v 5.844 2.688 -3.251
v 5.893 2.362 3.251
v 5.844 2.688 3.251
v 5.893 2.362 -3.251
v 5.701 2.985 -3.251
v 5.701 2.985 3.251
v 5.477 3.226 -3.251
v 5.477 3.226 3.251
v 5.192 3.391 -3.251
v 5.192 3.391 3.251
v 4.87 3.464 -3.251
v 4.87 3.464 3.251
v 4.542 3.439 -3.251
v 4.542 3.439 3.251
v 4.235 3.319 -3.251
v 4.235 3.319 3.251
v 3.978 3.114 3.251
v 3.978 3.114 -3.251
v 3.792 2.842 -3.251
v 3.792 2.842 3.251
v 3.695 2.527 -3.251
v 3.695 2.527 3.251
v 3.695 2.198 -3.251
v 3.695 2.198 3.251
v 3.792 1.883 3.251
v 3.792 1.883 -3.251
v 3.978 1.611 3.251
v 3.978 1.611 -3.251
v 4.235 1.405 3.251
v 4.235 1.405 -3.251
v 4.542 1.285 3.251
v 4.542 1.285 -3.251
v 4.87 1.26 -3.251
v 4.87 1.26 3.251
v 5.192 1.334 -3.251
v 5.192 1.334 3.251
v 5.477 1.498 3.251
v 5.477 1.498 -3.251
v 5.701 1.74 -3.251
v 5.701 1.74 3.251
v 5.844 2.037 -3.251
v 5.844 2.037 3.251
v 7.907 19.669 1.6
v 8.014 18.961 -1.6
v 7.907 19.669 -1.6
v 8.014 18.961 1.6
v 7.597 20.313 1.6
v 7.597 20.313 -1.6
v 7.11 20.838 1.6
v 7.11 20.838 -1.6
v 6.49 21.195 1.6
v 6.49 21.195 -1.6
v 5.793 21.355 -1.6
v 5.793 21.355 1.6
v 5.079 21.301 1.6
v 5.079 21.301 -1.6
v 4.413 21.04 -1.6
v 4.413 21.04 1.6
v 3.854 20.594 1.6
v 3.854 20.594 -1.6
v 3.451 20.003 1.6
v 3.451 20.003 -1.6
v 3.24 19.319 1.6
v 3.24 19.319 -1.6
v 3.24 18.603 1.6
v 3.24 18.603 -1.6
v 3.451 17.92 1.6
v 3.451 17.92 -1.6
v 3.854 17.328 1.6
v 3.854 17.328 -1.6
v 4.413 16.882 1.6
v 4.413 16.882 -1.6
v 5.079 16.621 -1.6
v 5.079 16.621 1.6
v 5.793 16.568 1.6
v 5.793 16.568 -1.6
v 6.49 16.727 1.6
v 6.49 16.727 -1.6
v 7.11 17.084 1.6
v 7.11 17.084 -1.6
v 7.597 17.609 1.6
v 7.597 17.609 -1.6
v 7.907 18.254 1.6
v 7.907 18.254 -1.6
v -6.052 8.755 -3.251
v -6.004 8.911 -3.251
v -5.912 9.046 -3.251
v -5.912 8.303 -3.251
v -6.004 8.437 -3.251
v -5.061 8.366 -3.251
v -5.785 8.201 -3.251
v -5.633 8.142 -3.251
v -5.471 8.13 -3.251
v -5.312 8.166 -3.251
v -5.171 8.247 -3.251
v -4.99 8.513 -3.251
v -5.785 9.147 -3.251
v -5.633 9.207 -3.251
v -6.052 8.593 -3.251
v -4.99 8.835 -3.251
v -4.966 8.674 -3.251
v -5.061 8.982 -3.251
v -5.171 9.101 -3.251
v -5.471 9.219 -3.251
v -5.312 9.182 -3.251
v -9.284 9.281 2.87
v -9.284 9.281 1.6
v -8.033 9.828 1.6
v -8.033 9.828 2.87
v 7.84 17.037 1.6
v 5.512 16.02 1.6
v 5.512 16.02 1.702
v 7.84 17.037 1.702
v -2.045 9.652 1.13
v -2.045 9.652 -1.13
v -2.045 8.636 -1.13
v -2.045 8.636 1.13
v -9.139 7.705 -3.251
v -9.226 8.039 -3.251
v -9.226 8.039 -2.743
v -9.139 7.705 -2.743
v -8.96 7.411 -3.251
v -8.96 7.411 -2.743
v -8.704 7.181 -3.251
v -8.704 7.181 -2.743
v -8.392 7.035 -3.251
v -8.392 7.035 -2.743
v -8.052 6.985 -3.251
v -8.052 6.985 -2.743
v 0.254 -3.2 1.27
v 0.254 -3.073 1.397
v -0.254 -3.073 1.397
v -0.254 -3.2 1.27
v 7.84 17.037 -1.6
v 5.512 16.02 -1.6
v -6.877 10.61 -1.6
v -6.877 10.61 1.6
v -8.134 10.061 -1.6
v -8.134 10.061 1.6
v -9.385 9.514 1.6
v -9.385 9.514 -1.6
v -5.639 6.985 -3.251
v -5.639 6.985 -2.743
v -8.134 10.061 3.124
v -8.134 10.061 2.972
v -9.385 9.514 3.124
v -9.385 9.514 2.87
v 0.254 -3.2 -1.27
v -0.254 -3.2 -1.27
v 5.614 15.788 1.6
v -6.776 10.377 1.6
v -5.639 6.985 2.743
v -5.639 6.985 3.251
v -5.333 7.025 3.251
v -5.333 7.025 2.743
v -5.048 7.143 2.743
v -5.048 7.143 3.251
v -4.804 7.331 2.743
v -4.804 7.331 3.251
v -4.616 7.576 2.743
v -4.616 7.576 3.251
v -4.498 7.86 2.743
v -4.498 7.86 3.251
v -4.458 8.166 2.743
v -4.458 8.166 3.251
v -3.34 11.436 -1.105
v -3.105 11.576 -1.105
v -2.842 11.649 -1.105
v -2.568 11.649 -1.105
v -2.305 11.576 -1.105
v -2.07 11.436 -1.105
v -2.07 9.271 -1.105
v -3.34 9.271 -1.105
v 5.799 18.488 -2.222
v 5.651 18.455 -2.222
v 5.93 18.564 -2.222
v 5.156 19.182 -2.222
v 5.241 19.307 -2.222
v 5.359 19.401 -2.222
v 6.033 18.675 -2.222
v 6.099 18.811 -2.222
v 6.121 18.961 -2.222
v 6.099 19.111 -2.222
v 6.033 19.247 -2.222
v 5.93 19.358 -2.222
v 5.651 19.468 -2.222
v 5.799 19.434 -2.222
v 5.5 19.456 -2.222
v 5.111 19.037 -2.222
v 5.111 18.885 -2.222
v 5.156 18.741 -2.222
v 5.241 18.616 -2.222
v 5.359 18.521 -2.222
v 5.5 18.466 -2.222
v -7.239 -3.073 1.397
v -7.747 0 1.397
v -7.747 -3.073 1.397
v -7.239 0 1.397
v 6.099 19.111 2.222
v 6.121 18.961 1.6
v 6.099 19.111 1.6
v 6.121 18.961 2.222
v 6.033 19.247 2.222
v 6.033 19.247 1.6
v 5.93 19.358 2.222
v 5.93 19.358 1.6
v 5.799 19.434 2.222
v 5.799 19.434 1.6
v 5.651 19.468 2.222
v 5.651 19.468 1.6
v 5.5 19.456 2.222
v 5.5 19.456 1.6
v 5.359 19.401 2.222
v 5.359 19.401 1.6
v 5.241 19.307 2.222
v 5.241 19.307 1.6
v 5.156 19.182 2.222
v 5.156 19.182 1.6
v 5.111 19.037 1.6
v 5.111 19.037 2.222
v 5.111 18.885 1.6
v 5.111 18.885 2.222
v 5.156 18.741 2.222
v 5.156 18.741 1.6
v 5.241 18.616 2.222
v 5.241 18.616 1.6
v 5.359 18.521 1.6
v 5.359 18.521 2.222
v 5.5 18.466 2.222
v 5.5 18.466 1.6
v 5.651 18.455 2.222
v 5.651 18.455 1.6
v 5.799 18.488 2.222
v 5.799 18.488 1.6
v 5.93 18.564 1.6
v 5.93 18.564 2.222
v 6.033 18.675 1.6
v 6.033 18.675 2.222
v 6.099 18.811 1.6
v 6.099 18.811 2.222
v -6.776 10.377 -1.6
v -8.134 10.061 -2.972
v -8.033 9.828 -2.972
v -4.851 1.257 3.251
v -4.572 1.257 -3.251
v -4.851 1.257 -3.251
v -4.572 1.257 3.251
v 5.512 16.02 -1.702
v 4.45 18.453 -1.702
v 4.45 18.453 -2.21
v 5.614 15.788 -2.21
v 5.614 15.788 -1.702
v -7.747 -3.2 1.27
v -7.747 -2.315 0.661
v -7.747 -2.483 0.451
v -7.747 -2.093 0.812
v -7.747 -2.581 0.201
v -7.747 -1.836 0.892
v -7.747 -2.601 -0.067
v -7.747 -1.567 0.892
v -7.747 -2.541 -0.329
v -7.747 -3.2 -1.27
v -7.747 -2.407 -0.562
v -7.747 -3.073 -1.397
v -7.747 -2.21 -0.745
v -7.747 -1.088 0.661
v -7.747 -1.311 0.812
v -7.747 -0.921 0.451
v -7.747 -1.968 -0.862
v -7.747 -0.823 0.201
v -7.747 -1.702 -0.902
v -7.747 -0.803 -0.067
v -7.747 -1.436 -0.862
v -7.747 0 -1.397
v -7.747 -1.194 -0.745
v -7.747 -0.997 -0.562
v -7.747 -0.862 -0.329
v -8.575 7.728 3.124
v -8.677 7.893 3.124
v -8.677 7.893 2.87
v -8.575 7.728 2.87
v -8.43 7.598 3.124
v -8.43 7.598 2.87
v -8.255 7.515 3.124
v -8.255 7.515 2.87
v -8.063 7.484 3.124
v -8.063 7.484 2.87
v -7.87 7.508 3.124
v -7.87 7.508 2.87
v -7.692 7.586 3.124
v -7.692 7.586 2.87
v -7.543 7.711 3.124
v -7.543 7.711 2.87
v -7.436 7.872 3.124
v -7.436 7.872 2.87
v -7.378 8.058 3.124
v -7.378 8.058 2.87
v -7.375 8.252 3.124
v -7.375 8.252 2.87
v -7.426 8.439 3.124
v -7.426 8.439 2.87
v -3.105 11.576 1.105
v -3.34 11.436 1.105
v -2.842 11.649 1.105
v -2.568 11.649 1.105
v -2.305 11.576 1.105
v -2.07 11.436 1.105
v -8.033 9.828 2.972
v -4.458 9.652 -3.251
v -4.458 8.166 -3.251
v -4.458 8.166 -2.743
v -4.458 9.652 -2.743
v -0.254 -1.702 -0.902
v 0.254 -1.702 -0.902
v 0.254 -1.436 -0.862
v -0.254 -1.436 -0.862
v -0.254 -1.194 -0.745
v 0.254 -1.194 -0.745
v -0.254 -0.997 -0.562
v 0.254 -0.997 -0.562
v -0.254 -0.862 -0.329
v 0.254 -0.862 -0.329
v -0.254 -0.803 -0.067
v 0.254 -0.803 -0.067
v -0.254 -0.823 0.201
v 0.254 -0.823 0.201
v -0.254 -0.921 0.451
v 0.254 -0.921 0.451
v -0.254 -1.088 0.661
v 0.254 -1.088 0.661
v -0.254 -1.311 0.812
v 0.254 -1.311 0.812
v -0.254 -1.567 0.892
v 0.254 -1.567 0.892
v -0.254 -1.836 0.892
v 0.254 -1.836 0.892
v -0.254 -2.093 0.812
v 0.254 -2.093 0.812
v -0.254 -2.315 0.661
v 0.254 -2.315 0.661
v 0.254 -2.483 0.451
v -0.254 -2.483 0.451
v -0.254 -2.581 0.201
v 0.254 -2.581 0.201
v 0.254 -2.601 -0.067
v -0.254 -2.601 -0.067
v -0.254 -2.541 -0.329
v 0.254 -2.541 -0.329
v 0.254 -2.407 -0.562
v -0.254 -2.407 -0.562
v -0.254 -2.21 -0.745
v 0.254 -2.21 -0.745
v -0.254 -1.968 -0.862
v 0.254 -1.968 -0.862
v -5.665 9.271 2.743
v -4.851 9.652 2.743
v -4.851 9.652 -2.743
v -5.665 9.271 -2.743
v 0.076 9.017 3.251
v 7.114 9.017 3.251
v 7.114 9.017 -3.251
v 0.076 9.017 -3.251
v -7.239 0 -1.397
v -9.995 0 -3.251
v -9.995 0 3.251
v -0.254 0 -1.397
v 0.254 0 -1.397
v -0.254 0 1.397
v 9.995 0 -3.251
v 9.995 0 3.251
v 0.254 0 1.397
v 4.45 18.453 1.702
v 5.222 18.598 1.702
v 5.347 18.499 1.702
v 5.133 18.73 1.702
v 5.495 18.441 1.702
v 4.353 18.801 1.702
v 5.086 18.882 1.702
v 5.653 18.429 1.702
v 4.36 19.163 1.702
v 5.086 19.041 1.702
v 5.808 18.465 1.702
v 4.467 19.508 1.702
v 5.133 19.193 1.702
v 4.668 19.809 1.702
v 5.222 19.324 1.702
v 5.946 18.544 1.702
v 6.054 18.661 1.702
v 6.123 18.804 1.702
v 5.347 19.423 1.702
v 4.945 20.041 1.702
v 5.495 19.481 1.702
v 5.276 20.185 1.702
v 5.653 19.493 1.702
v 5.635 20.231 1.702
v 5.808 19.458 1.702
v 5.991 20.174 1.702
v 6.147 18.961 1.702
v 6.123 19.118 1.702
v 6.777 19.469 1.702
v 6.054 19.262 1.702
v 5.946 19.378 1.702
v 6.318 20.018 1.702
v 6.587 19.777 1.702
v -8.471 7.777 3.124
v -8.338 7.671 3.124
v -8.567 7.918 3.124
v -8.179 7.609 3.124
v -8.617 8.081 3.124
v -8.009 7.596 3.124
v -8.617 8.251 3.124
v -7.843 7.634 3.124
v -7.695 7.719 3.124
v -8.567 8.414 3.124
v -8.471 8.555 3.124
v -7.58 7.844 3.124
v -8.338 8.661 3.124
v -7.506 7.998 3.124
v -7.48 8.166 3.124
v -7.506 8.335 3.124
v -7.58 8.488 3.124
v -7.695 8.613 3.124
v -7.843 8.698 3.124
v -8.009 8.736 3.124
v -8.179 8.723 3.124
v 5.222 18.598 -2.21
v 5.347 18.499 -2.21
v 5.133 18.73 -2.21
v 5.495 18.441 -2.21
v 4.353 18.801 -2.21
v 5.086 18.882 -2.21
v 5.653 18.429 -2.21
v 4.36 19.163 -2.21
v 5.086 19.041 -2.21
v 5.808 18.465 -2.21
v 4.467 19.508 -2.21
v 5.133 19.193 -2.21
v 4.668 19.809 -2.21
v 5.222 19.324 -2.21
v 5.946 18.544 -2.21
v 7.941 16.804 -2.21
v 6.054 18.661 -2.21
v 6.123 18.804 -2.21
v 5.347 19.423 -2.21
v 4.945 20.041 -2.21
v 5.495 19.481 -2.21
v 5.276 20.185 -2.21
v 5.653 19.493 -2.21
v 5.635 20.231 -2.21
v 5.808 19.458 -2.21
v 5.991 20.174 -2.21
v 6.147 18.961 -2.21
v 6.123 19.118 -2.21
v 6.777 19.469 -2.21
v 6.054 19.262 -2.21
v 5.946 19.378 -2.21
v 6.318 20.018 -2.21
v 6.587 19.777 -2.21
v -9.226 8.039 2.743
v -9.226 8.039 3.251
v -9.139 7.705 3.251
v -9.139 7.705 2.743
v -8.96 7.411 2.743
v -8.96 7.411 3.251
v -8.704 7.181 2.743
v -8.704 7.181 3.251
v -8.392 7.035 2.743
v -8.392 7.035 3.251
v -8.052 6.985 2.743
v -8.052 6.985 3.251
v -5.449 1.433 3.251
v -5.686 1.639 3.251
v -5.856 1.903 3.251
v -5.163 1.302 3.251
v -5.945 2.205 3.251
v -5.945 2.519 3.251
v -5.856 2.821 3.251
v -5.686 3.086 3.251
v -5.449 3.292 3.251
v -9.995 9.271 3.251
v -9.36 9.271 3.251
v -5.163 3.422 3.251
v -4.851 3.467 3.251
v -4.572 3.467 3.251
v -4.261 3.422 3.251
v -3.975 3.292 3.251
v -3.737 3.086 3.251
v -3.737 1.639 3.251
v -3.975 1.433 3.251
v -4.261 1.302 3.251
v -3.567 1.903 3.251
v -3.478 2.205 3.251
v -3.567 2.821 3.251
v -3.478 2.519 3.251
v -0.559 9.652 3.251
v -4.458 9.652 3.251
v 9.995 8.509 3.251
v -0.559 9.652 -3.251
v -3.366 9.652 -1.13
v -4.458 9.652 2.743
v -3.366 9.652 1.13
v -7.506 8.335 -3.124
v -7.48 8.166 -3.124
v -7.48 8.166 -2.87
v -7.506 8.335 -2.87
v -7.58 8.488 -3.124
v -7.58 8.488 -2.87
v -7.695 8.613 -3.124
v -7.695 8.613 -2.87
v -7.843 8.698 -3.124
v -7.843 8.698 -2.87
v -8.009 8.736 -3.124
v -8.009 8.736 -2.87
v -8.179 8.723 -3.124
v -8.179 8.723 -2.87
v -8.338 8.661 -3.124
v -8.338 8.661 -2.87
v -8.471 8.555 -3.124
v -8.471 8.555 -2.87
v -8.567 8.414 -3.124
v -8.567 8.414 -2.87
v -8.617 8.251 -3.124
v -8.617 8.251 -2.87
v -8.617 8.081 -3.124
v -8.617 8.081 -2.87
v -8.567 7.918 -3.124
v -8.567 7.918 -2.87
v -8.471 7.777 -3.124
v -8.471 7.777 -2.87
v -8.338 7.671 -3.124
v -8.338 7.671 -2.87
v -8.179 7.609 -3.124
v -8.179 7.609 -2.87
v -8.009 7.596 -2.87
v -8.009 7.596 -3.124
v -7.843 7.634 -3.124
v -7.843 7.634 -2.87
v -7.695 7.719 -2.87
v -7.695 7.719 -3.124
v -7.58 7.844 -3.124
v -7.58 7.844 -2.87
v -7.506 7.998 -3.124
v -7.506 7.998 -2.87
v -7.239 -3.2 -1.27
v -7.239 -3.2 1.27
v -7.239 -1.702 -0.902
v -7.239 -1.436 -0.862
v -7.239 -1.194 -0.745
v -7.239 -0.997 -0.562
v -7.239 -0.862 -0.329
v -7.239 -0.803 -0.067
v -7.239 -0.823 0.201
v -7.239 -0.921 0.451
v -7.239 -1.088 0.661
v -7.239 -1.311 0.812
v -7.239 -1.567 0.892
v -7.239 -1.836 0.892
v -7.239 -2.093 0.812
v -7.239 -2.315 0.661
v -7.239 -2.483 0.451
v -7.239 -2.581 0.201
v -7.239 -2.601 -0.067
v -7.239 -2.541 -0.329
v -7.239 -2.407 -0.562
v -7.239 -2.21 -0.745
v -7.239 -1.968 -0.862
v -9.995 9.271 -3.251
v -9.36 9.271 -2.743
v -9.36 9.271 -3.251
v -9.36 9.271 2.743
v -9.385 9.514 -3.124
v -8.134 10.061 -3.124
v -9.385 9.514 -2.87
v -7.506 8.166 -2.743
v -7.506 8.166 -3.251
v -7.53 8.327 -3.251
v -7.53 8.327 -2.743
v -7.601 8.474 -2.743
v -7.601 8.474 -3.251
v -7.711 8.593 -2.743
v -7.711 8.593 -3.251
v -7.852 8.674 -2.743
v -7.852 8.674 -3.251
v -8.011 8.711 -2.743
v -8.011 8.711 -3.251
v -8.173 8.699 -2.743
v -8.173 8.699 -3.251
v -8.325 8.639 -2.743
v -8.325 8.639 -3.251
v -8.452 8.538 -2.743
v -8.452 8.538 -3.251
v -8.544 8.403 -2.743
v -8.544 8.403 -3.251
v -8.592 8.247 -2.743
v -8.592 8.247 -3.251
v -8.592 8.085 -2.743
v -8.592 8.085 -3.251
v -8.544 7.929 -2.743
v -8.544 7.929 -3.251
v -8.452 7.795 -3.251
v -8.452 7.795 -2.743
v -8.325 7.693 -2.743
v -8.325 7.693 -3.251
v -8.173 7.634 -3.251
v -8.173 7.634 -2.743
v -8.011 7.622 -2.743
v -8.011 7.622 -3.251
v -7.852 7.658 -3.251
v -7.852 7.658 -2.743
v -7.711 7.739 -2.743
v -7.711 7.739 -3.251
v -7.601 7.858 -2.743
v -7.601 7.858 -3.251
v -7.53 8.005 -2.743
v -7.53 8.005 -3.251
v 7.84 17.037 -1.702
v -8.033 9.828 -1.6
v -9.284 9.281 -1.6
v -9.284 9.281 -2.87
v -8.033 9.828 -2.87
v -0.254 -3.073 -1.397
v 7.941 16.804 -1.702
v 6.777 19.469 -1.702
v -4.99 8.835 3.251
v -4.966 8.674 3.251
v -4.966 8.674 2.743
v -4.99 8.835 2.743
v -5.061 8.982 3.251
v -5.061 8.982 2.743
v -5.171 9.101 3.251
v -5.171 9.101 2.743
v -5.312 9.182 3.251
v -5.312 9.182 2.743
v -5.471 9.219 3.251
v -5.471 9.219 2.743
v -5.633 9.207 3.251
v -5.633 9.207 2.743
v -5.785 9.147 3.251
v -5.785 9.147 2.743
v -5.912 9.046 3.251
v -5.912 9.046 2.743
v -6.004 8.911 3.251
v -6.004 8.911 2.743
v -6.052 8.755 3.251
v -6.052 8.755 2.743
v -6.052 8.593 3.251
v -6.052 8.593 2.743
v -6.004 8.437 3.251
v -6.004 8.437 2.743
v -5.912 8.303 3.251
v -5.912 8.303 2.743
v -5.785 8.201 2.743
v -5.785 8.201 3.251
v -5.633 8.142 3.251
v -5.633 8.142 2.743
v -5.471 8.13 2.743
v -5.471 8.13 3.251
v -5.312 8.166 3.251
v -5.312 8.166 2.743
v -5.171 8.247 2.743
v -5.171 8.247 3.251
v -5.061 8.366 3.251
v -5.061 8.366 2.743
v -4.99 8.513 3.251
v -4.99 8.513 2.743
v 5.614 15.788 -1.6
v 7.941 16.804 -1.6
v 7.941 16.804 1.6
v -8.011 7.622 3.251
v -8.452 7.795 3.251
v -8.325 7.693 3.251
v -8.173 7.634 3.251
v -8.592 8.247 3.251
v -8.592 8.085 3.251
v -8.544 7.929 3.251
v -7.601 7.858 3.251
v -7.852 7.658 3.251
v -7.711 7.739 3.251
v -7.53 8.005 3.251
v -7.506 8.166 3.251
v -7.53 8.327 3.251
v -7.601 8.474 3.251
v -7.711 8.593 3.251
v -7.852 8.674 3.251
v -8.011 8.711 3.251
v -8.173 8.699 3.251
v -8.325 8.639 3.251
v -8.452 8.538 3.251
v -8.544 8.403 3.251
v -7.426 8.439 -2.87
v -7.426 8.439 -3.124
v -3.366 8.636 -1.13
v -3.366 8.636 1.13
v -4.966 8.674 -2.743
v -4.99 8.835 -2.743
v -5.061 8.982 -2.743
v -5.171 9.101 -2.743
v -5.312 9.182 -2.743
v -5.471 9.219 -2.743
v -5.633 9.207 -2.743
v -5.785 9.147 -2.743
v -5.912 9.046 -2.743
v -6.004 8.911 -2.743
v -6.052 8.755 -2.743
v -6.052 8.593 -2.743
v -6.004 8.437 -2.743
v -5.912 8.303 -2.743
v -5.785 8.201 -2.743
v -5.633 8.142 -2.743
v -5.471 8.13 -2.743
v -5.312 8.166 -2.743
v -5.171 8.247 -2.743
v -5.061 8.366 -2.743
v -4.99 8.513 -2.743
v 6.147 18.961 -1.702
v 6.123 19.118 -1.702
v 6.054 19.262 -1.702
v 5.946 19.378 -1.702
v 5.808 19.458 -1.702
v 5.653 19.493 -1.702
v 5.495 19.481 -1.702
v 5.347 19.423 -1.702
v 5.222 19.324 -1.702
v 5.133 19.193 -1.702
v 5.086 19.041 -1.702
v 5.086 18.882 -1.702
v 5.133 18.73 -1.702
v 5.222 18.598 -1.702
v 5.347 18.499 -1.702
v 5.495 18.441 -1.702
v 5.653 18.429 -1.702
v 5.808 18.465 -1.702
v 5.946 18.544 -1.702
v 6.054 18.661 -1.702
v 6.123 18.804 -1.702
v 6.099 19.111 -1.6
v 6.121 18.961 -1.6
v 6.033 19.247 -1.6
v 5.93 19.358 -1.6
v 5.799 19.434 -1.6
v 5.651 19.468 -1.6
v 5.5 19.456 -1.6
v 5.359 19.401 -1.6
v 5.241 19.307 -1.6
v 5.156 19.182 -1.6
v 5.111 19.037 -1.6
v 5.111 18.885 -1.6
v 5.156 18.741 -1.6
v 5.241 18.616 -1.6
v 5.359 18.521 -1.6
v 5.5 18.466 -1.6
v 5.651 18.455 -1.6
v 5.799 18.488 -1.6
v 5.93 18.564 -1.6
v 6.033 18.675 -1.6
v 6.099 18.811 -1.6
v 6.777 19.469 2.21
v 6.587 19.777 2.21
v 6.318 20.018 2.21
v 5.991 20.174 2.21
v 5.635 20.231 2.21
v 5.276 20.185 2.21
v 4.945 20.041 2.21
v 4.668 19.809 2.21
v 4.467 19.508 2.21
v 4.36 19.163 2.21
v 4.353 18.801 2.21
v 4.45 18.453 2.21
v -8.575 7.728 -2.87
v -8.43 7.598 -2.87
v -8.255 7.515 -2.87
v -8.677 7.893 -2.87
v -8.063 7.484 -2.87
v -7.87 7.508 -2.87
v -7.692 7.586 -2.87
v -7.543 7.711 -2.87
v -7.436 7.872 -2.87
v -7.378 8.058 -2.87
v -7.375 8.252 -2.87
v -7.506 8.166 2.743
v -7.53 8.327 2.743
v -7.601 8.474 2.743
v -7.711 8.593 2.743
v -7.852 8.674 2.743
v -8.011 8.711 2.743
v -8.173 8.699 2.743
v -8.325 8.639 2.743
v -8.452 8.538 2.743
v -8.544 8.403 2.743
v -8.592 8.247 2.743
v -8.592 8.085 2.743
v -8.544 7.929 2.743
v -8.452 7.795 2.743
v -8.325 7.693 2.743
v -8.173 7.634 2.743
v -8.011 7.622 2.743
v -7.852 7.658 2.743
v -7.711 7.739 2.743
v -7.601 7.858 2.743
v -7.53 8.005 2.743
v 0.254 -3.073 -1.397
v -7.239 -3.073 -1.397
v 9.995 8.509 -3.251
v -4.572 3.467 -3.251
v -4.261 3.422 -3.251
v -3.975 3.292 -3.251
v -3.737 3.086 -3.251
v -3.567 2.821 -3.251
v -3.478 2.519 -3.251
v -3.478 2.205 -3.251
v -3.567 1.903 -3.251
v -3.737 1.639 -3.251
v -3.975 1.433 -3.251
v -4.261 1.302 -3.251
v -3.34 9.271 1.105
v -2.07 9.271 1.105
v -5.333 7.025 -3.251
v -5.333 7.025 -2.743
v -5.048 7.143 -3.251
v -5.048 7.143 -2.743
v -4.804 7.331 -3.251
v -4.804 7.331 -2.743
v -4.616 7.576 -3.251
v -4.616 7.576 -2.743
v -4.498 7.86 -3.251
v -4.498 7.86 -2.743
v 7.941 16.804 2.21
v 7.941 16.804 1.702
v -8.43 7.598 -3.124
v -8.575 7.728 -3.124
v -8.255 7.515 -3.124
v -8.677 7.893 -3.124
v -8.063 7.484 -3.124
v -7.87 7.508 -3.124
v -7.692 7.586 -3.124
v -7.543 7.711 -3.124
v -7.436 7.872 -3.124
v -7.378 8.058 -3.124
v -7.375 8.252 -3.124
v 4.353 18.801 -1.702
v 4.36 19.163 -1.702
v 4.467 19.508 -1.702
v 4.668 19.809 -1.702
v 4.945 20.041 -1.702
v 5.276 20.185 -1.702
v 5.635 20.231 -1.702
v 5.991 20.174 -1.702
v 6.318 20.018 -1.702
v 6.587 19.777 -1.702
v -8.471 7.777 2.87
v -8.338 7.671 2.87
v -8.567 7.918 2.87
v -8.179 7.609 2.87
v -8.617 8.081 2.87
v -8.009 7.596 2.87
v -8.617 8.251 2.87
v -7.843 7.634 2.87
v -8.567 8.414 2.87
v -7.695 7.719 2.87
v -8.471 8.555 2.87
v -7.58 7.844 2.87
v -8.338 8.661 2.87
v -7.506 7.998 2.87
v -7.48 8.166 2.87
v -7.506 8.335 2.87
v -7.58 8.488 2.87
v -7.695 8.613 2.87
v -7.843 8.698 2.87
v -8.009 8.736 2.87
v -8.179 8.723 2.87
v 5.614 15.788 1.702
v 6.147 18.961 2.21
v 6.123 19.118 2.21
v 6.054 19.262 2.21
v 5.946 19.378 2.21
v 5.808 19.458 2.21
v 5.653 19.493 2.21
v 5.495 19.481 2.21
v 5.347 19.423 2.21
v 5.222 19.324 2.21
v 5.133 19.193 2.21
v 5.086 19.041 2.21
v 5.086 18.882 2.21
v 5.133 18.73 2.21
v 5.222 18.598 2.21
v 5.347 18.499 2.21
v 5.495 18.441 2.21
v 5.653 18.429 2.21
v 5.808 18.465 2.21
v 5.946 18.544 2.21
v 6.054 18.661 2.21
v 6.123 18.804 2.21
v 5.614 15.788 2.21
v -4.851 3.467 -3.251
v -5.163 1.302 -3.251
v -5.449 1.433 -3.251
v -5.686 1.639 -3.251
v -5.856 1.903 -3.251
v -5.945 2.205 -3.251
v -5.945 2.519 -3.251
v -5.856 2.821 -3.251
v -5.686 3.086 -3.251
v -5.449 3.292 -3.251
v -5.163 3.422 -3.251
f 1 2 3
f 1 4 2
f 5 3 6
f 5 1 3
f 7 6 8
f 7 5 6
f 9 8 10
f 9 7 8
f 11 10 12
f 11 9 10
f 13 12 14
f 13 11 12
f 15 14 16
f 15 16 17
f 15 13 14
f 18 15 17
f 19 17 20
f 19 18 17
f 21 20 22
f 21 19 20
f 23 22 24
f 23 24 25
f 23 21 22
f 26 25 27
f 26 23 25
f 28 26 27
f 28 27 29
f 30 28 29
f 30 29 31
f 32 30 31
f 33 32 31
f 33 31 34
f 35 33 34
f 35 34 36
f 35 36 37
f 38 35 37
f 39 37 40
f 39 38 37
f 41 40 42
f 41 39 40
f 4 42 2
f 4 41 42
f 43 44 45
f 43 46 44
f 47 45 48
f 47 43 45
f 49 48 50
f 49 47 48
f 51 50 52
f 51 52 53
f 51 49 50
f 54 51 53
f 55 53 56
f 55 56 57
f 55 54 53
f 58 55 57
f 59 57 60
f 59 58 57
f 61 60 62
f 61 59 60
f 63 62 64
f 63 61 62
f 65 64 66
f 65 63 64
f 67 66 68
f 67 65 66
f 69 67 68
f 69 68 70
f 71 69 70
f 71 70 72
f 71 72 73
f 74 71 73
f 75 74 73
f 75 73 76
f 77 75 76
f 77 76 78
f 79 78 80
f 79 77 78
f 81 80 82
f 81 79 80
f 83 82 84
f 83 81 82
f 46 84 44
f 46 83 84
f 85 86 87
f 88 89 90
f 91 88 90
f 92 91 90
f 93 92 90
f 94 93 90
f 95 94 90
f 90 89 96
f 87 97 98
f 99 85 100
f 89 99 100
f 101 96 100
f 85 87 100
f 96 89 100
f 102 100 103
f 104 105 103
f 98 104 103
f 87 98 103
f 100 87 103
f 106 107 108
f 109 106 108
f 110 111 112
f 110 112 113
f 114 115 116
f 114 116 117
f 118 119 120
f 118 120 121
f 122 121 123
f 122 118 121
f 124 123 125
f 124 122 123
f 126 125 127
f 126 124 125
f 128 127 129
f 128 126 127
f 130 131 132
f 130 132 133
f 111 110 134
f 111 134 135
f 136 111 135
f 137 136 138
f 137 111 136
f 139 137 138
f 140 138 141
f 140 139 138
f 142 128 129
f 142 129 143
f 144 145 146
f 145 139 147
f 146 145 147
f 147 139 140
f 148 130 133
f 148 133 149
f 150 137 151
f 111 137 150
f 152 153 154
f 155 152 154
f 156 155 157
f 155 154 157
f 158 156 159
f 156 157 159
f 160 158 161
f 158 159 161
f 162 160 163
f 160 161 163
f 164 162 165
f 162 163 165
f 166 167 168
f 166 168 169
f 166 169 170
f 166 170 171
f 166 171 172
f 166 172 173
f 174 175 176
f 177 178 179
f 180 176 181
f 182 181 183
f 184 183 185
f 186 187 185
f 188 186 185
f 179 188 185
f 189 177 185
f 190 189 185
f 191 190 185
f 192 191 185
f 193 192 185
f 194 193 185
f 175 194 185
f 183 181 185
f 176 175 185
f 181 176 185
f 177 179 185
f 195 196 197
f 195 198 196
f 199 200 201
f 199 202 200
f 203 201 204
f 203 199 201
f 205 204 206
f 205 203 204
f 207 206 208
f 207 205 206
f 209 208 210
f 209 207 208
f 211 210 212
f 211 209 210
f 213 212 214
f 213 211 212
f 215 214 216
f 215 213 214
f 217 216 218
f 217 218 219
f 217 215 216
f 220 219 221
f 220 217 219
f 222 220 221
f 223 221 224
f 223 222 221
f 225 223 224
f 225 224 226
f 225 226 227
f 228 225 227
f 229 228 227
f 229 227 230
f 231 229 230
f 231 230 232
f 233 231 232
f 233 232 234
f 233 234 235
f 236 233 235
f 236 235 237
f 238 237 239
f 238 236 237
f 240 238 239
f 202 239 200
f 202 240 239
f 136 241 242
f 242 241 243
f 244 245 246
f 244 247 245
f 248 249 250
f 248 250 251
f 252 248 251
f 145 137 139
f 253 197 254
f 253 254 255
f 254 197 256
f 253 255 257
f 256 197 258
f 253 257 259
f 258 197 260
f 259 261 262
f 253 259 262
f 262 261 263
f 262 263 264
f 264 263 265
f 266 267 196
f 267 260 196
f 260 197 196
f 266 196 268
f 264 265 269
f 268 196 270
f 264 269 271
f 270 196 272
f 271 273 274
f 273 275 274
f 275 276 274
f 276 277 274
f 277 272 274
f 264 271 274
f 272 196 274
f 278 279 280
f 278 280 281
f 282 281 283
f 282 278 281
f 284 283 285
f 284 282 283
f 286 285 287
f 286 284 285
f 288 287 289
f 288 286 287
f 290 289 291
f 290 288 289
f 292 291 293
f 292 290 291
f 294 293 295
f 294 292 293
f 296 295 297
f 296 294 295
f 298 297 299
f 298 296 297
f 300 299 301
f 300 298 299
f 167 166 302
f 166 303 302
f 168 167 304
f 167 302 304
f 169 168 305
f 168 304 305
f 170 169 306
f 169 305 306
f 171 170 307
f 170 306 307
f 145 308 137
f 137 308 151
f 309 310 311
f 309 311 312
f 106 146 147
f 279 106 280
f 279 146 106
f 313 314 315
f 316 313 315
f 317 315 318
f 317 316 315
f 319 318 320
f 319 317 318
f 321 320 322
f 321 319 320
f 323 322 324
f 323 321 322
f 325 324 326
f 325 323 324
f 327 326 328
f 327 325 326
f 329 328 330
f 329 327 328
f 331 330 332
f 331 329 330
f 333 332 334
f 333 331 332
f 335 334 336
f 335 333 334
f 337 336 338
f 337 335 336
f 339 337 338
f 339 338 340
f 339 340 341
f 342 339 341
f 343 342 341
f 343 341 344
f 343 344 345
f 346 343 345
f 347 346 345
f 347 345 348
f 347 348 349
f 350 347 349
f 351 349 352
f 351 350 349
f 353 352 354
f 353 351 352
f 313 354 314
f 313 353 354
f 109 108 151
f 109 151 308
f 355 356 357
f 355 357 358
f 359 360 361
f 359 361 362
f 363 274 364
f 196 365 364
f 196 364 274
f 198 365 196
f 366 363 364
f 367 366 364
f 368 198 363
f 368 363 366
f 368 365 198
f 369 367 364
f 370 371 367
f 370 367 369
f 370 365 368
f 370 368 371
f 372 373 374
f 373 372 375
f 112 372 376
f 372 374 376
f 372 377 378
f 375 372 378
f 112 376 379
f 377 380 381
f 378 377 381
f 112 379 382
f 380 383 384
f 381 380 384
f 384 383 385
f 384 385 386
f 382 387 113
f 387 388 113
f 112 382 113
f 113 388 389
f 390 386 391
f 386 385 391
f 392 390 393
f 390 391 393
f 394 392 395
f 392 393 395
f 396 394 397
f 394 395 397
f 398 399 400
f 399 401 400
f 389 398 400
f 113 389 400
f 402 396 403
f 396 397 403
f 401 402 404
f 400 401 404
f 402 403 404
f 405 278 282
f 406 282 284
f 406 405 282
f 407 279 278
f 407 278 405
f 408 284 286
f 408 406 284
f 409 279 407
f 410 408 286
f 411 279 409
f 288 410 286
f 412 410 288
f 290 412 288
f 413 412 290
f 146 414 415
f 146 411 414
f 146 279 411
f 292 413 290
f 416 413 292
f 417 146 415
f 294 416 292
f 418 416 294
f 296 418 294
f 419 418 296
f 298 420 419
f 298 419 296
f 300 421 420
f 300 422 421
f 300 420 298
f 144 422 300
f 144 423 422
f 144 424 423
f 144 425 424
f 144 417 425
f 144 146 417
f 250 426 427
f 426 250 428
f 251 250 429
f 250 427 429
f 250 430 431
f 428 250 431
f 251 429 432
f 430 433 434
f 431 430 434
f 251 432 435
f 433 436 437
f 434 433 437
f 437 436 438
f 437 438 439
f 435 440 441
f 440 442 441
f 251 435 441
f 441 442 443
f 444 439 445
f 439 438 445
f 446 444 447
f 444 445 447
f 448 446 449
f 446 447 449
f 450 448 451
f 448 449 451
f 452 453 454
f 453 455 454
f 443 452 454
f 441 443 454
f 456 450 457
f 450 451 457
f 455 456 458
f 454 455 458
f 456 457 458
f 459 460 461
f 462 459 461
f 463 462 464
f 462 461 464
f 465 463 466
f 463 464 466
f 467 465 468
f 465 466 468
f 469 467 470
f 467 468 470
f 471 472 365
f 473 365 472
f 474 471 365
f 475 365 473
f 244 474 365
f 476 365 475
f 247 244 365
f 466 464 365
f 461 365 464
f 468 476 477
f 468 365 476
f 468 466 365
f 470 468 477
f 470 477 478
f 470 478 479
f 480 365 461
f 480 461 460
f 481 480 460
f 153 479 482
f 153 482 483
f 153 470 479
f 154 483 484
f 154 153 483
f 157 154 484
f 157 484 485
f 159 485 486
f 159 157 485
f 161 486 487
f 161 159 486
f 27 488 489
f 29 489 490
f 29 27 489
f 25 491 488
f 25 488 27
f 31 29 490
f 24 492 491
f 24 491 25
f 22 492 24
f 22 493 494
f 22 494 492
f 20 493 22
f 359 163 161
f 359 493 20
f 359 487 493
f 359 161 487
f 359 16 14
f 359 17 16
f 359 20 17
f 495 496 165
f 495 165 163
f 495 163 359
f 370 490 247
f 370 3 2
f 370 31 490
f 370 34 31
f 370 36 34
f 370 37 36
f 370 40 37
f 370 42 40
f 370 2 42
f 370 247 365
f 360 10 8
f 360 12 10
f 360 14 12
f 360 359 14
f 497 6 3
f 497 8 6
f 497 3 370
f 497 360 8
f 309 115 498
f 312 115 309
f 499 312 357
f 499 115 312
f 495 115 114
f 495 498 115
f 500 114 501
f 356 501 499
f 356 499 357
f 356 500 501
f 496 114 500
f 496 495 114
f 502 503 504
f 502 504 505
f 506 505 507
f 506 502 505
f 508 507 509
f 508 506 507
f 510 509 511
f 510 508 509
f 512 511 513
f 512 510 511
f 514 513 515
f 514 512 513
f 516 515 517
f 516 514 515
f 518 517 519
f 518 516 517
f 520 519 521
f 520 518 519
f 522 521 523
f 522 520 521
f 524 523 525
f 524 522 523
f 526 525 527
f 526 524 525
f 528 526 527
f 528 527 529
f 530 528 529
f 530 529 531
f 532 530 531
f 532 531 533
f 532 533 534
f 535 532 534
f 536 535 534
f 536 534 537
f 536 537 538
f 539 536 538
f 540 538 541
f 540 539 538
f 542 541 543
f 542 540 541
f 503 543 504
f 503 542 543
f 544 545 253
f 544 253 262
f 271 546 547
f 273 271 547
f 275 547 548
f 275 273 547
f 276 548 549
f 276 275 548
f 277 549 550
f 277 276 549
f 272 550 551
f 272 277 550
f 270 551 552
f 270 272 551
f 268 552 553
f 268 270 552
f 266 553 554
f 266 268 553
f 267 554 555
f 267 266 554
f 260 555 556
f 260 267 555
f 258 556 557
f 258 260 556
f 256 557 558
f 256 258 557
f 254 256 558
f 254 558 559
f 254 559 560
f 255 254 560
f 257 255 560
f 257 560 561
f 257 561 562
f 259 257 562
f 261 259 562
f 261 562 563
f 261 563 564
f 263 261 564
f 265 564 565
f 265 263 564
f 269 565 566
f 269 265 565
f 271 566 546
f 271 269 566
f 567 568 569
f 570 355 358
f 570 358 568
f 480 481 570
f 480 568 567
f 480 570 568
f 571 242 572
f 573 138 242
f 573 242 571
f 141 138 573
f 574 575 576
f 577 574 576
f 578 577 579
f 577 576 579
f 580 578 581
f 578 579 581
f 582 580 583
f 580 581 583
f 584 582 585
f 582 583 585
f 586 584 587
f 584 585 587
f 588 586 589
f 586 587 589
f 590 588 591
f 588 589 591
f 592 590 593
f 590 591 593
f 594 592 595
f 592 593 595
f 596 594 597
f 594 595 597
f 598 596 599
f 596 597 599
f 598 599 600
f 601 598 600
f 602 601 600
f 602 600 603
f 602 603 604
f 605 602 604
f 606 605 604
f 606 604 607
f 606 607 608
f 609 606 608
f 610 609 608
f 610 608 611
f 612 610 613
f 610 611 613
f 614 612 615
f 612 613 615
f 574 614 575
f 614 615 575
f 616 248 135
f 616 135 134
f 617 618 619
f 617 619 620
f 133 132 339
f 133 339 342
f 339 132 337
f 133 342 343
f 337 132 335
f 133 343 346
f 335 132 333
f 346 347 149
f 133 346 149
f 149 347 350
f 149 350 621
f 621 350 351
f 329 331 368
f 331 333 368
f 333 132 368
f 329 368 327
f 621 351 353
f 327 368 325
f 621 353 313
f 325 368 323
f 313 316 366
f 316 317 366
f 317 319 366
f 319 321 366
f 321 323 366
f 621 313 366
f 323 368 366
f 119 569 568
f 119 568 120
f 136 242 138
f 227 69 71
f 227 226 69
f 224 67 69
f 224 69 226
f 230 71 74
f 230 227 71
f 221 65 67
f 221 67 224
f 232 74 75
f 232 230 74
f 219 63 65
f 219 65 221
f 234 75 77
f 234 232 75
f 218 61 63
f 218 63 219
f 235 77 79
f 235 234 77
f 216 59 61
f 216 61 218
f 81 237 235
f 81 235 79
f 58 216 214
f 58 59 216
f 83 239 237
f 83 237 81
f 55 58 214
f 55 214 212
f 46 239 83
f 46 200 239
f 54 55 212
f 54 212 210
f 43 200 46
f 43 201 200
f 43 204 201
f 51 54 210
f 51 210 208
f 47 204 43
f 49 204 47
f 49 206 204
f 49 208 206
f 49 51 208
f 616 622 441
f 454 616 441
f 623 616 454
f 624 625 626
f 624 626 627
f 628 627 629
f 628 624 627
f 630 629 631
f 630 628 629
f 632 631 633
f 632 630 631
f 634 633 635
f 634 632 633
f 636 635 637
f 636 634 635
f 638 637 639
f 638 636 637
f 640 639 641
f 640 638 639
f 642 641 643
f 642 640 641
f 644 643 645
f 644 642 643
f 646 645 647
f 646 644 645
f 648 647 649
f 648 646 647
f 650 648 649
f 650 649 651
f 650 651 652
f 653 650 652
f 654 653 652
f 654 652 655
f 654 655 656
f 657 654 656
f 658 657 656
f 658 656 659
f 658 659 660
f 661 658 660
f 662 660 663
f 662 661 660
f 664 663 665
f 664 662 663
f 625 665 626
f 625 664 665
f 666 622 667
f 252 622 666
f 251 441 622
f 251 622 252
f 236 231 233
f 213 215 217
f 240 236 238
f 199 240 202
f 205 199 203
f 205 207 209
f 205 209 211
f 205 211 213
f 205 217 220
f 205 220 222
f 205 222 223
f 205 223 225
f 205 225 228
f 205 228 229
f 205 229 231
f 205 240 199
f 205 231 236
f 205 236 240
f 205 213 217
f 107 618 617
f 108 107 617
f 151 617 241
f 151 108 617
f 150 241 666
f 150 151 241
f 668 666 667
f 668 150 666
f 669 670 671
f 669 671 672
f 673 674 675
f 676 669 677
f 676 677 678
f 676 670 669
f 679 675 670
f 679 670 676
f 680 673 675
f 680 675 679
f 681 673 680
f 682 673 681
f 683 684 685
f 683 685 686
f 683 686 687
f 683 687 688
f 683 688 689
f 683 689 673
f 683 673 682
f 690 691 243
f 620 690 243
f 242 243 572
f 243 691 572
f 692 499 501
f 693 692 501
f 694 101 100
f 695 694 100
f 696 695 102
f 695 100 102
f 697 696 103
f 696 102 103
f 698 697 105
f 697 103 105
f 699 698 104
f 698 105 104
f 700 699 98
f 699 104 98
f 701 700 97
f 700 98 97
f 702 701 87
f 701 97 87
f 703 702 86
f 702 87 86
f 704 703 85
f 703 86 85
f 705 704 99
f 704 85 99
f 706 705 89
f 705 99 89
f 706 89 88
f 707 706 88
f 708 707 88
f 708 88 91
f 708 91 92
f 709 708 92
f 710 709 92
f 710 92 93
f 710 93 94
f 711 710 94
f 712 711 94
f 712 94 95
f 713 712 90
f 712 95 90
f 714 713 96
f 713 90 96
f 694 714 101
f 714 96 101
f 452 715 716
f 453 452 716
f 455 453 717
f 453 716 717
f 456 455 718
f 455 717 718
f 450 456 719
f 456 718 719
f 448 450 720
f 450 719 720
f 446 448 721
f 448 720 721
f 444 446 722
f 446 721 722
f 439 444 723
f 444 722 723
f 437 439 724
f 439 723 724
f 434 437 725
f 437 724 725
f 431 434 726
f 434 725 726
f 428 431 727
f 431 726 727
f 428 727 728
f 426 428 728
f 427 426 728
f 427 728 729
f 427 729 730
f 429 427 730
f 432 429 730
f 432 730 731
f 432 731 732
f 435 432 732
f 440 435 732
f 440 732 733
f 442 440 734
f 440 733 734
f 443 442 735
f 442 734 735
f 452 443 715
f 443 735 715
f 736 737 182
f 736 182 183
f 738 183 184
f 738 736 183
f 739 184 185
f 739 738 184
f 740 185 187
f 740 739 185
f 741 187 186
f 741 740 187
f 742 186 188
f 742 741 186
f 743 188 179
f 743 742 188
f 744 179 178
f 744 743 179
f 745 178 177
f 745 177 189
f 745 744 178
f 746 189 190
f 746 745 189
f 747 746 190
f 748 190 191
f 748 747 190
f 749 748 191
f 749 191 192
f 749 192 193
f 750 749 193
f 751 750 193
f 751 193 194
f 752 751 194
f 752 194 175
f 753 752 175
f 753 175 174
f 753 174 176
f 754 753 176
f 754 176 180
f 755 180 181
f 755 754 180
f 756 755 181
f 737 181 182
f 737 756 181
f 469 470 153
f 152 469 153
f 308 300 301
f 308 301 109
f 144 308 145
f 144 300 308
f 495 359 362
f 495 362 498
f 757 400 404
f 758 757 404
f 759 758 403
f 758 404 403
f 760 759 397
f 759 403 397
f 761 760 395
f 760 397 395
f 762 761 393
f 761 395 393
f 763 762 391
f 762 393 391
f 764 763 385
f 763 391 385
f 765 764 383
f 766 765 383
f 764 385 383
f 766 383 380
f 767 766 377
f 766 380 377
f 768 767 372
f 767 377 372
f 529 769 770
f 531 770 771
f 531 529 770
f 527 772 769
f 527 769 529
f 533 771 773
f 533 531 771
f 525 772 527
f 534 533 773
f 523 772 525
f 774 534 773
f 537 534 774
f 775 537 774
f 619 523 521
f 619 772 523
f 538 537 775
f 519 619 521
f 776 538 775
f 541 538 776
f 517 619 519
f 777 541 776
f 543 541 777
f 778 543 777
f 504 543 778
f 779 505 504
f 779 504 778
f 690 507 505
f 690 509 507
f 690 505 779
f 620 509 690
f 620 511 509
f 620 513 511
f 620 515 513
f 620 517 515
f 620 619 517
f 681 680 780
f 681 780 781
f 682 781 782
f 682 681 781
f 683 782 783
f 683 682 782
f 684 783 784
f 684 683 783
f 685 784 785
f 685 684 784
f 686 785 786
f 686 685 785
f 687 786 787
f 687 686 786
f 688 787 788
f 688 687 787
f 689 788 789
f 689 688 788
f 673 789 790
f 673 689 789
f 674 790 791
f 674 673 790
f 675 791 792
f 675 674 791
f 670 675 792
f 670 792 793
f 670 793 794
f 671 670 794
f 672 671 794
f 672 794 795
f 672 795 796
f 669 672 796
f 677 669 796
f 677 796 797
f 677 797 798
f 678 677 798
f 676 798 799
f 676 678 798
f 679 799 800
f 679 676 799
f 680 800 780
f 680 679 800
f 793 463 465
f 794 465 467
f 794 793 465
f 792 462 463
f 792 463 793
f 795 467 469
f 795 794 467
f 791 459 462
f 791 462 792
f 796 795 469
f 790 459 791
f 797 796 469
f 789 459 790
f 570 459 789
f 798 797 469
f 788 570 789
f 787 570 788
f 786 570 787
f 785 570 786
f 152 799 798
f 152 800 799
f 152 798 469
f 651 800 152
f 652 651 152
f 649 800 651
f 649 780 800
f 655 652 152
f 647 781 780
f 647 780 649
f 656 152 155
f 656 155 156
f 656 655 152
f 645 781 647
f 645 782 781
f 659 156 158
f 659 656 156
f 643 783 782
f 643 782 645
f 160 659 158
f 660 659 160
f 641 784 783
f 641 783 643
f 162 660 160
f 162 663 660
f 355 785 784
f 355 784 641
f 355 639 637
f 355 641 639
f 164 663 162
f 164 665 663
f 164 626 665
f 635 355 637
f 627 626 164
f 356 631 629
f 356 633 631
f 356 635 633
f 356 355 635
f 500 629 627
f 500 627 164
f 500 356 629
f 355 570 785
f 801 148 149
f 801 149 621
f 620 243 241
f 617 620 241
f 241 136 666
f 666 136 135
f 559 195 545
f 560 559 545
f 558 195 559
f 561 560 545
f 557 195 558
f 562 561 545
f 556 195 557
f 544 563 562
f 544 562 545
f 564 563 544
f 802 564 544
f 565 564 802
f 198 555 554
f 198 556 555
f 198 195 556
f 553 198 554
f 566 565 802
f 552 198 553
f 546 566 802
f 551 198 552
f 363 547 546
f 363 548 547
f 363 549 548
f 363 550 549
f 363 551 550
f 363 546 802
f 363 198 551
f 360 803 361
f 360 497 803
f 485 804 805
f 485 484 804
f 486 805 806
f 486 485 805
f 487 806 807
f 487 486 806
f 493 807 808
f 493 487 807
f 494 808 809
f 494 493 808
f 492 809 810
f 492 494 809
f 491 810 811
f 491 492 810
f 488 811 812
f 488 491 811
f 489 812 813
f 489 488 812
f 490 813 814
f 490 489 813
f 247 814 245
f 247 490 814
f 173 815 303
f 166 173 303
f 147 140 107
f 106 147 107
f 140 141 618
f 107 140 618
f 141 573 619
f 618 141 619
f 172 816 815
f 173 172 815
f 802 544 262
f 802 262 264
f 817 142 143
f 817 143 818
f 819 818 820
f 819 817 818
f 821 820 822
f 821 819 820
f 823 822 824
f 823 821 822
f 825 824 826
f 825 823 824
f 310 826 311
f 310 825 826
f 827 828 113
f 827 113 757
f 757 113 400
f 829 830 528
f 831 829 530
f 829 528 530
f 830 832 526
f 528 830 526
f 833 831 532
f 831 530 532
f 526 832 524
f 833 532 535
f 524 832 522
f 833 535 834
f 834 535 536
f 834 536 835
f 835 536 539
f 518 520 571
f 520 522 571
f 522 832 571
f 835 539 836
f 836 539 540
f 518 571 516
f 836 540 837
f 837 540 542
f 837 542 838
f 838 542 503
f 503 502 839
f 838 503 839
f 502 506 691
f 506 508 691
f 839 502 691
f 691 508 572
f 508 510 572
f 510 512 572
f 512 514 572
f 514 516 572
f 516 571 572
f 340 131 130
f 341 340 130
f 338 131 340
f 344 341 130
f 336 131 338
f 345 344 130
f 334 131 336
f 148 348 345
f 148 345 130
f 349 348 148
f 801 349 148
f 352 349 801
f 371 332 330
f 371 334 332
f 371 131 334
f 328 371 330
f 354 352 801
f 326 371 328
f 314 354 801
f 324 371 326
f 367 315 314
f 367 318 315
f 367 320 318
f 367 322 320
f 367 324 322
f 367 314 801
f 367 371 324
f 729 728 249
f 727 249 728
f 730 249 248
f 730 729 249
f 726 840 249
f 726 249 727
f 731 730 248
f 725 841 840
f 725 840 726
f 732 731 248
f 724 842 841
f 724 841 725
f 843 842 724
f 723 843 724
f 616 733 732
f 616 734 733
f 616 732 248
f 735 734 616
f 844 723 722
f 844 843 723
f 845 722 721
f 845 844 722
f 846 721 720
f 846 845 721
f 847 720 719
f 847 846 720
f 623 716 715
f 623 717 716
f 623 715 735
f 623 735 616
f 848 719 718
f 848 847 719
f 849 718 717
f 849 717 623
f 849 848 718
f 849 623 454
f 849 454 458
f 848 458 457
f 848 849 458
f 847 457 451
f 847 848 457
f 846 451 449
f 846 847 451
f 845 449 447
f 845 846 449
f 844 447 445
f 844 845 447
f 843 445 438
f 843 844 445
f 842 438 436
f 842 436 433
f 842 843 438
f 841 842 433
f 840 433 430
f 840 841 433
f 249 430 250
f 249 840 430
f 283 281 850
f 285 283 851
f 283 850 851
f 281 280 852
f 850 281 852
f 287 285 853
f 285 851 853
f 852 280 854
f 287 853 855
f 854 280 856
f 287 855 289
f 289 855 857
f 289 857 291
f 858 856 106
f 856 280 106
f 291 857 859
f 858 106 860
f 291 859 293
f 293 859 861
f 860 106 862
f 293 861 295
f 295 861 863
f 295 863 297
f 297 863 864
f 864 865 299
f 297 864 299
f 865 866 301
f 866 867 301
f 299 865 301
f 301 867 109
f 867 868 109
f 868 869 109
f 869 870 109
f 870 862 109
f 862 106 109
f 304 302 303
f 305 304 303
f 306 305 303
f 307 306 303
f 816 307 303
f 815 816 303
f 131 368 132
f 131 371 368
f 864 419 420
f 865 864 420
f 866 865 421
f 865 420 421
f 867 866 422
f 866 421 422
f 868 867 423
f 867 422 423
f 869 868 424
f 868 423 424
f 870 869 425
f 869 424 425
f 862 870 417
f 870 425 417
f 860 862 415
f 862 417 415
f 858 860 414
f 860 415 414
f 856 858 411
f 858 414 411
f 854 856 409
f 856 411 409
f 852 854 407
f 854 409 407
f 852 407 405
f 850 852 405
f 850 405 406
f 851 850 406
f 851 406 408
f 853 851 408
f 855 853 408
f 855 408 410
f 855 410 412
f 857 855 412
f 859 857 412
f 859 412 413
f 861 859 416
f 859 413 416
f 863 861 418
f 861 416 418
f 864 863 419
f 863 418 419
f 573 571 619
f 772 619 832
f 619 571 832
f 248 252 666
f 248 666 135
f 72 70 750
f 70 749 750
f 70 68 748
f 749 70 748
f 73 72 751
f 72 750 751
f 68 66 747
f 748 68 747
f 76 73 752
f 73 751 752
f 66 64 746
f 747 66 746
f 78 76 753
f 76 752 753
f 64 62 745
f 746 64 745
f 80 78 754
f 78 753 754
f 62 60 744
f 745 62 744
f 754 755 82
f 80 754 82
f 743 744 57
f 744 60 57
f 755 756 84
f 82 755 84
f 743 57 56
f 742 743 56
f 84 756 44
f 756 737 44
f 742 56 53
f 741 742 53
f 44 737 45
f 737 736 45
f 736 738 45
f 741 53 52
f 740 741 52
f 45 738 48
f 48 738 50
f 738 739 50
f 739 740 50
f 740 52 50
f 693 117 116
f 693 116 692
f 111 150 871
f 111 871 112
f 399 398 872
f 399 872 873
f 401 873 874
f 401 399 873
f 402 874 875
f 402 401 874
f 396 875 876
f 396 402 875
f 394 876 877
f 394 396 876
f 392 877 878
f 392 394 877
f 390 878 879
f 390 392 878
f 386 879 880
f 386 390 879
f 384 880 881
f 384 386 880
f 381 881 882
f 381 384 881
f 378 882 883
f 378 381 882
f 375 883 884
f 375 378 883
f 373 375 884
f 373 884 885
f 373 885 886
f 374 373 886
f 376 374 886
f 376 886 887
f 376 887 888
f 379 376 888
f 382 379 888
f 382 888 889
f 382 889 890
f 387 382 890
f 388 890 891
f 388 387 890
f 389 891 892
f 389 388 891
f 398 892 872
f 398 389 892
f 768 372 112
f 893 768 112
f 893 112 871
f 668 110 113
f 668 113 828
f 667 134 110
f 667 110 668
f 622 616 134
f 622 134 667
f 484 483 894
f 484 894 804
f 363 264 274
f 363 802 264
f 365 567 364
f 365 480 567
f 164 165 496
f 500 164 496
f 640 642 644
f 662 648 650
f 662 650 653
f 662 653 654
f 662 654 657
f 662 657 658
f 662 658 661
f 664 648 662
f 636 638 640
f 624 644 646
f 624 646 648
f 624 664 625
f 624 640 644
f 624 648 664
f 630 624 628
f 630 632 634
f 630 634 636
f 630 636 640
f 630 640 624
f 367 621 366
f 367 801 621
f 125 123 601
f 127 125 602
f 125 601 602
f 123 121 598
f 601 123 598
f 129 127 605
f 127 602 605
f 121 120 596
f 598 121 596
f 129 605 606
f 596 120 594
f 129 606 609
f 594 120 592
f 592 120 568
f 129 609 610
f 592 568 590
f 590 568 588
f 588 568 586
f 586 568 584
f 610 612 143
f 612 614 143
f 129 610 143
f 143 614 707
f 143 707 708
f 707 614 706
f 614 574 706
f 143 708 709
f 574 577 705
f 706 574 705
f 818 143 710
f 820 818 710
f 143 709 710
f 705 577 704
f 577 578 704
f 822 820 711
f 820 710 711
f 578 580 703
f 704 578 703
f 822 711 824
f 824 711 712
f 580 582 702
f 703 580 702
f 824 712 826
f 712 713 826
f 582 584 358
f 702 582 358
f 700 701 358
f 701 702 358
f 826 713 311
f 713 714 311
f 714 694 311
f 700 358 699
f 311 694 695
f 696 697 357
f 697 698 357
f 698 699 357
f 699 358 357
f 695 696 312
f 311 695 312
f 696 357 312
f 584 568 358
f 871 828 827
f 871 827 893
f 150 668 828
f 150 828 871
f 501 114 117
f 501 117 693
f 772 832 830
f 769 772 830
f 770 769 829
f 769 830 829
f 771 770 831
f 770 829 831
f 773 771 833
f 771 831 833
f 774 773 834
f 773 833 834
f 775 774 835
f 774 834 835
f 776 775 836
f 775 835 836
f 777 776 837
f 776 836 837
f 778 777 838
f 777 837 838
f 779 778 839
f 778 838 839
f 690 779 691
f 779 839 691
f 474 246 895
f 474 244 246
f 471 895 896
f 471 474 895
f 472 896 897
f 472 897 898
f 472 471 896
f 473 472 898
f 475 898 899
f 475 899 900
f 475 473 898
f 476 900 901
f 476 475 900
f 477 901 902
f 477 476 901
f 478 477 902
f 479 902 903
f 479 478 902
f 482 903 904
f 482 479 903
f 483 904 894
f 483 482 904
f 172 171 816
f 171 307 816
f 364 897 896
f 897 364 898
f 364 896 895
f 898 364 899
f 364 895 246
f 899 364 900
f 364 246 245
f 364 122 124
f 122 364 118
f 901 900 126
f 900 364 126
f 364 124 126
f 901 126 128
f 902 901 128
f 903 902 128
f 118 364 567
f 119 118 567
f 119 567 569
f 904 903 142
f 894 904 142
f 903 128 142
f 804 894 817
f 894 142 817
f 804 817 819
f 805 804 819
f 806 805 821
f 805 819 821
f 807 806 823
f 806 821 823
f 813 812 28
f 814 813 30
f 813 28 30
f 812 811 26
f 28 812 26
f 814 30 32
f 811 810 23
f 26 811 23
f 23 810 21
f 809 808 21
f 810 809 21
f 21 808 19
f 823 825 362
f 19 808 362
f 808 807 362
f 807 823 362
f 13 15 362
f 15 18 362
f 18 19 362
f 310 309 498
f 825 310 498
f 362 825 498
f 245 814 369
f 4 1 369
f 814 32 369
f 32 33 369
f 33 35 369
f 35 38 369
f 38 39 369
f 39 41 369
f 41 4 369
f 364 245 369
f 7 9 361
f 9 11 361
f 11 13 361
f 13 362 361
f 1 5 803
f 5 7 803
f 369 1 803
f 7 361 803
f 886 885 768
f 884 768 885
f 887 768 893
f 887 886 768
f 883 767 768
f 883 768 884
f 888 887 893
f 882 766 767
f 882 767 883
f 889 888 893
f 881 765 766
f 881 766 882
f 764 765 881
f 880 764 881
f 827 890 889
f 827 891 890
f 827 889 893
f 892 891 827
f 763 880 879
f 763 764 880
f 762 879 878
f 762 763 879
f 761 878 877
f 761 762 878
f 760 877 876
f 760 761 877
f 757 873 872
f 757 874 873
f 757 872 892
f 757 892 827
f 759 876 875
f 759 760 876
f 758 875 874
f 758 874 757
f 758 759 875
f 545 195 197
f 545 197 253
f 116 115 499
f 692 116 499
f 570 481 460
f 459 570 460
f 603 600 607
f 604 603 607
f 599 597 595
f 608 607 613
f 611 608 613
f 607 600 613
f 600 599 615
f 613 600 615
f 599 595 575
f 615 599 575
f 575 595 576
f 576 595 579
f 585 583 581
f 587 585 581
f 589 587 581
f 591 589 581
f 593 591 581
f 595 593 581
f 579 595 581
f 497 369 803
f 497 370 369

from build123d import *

# Parameters (mm, degrees)
SKETCH2_R            = 1.1049
EXTRUDE1_DEPTH       = 3.2512
EXTRUDE2_DEPTH       = 1.1049
SKETCH4_W            = 1.3208
SKETCH4_H            = 2.2606
CUT_EXTRUDE1_DEPTH   = 1.016
SKETCH5_R            = 0.5461
CUT_EXTRUDE2_DEPTH   = 0.508
SKETCH10_R           = 0.9017
EXTRUDE6_DEPTH       = 0.254
LPATTERN1_COUNT      = 2
LPATTERN1_PITCH      = 7.493
EXTRUDE3_DEPTH       = 1.6002
EXTRUDE4_START       = -0.127
SKETCH8_R            = 0.5715
EXTRUDE4_DEPTH       = 0.254
EXTRUDE5_DEPTH       = 1.27
SKETCH11_R           = 2.4003
EXTRUDE7_DEPTH       = 1.6002
SKETCH12_R           = 0.508
EXTRUDE8_DEPTH       = 2.2225
EXTRUDE9_START       = 0.1016
SKETCH13_R           = 0.5334
EXTRUDE9_DEPTH       = 0.508
EXTRUDE10_DEPTH      = 2.2098
EXTRUDE10_DEPTH_BACK = 2.2098


with BuildPart() as part:
    # Sketch2 → Extrude1 (new, symmetric)
    with BuildSketch(Plane.XY):
        Polygon((9.9949, 8.509), (7.113888836, 9.017), (0.0762, 9.017), (-0.5588, 9.652), (-4.8514, 9.652), (-5.664596778, 9.271), (-9.9949, 9.271), (-9.9949, 0), (9.9949, 0), align=None)
        with Locations((4.7879, 2.3622)):
            Circle(SKETCH2_R, mode=Mode.SUBTRACT)
        with BuildLine():
            Line((-4.8514, 3.4671), (-4.572, 3.4671))
            ThreePointArc((-4.572, 3.4671), (-3.4671, 2.3622), (-4.572, 1.2573))
            Line((-4.572, 1.2573), (-4.8514, 1.2573))
            ThreePointArc((-4.8514, 1.2573), (-5.9563, 2.3622), (-4.8514, 3.4671))
        make_face(mode=Mode.SUBTRACT)
    extrude(amount=EXTRUDE1_DEPTH, both=True)

    # Sketch4 → Cut-Extrude1 (cut)
    with BuildSketch(Plane(origin=(0, 9.652, 0), x_dir=(-1, 0, 0), z_dir=(0, 1, 0))):
        with Locations((2.7051, 0)):
            Rectangle(SKETCH4_W, SKETCH4_H)
    extrude(amount=-CUT_EXTRUDE1_DEPTH, mode=Mode.SUBTRACT)

    # Sketch5 → Cut-Extrude2 (cut)
    with BuildSketch(Plane.XY.offset(3.2512)):
        with BuildLine():
            Line((-8.0518, 6.985), (-5.6388, 6.985))
            ThreePointArc((-5.6388, 6.985), (-4.803636181, 7.330936181), (-4.4577, 8.1661))
            Line((-4.4577, 8.1661), (-4.4577, 9.652))
            Line((-4.4577, 9.652), (-4.8514, 9.652))
            Line((-4.8514, 9.652), (-5.664596778, 9.271))
            Line((-5.664596778, 9.271), (-9.2329, 9.271))
            Line((-9.2329, 9.271), (-9.3599, 9.271))
            Line((-9.3599, 9.271), (-9.225989606, 8.038522651))
            ThreePointArc((-9.225989606, 8.038522651), (-8.840569803, 7.286987147), (-8.0518, 6.985))
        make_face()
        with Locations((-5.5118, 8.6741)):
            Circle(SKETCH5_R, mode=Mode.SUBTRACT)
        with Locations((-8.0518, 8.1661)):
            Circle(SKETCH5_R, mode=Mode.SUBTRACT)
    cut_extrude2 = extrude(amount=-CUT_EXTRUDE2_DEPTH, mode=Mode.SUBTRACT)

    # Mirror1: Cut-Extrude2 across plane
    add(cut_extrude2.mirror(Plane.XY), mode=Mode.SUBTRACT)

    # Sketch10 → Extrude6 (add, symmetric)
    with BuildSketch(Plane(origin=(-7.493, 0, 0), x_dir=(0, 0, -1), z_dir=(1, 0, 0))):
        Polygon((-1.397, 0), (-1.397, -3.0734), (-1.27, -3.2004), (1.27, -3.2004), (1.397, -3.0734), (1.397, 0), align=None)
        with Locations((0, -1.7018)):
            Circle(SKETCH10_R, mode=Mode.SUBTRACT)
    extrude6 = extrude(amount=EXTRUDE6_DEPTH, both=True)

    # LPattern1: Extrude6 ×2
    with Locations(*[(i * LPATTERN1_PITCH, 0, 0) for i in range(1, LPATTERN1_COUNT)]):
        add(extrude6)


with BuildPart() as body_2:
    # Sketch3 → Extrude2 (new, symmetric)
    with BuildSketch(Plane.XY):
        with BuildLine():
            Line((-3.3401, 9.271), (-3.3401, 11.435714746))
            ThreePointArc((-3.3401, 11.435714746), (-2.7051, 11.6586), (-2.0701, 11.435714746))
            Line((-2.0701, 11.435714746), (-2.0701, 9.271))
            Line((-2.0701, 9.271), (-3.3401, 9.271))
        make_face()
    extrude(amount=EXTRUDE2_DEPTH, both=True)


with BuildPart() as body_3:
    # Sketch6 → Extrude3 (new, symmetric)
    with BuildSketch(Plane.XY):
        Polygon((-9.2837, 9.281466924), (7.941234618, 16.804182087), (7.839576305, 17.036951474), (-9.385358313, 9.514236311), align=None)
    extrude(amount=EXTRUDE3_DEPTH, both=True)


with BuildPart() as body_4:
    # Sketch8 → Extrude4 (new body)
    with BuildSketch(Plane.XY.offset(3.2512).offset(EXTRUDE4_START)):
        with BuildLine():
            Line((-7.426320532, 8.439268171), (-8.134399377, 10.060572652))
            Line((-8.134399377, 10.060572652), (-9.385358313, 9.514236311))
            Line((-9.385358313, 9.514236311), (-8.677279468, 7.892931829))
            ThreePointArc((-8.677279468, 7.892931829), (-7.778631829, 7.540620532), (-7.426320532, 8.439268171))
        make_face()
        with Locations((-8.0518, 8.1661)):
            Circle(SKETCH8_R, mode=Mode.SUBTRACT)
    extrude(amount=-EXTRUDE4_DEPTH)

    # Sketch9 → Extrude5 (add)
    with BuildSketch(Plane.XY.offset(1.6002)):
        Polygon((-8.032741064, 9.827803266), (-8.134399377, 10.060572652), (-9.385358313, 9.514236311), (-9.2837, 9.281466924), align=None)
    extrude(amount=EXTRUDE5_DEPTH)


with BuildPart() as body_5:
    # Mirror7: mirrored copy
    add(body_4.part.mirror(Plane.XY))

    # Combine1: union body 3, body 4
    add(body_3.part)
    add(body_4.part)



with BuildPart() as body_4_2:
    # Sketch11 → Extrude7 (new, symmetric)
    with BuildSketch(Plane.XY):
        with Locations((5.6134, 18.9611)):
            Circle(SKETCH11_R)
    extrude(amount=EXTRUDE7_DEPTH, both=True)

    # Sketch12 → Extrude8 (add, symmetric)
    with BuildSketch(Plane.XY):
        with Locations((5.6134, 18.9611)):
            Circle(SKETCH12_R)
    extrude(amount=EXTRUDE8_DEPTH, both=True)


with BuildPart() as body_5_2:
    # Sketch13 → Extrude9 (new body)
    with BuildSketch(Plane.XY.offset(1.6002).offset(EXTRUDE9_START)):
        with BuildLine():
            Line((5.61354075, 15.787598957), (7.941234618, 16.804182087))
            Line((7.941234618, 16.804182087), (6.777246934, 19.469391565))
            ThreePointArc((6.777246934, 19.469391565), (5.105108435, 20.124946934), (4.449553066, 18.452808435))
            Line((4.449553066, 18.452808435), (5.61354075, 15.787598957))
        make_face()
        with Locations((5.6134, 18.9611)):
            Circle(SKETCH13_R, mode=Mode.SUBTRACT)
    extrude(amount=EXTRUDE9_DEPTH)


with BuildPart() as body_6:
    # Mirror8: mirrored copy
    add(body_5_2.part.mirror(Plane.XY))


with BuildPart() as body_5_1:
    add(body_5.part)

    add(body_5_2.part)  # Extrude10 merges body 5 2

    add(body_6.part)  # Extrude10 merges body 6
    # Sketch14 → Extrude10 (add, two sides: drawn at the far end of the back side and taken through both)
    with BuildSketch(Plane.XY.offset(-EXTRUDE10_DEPTH_BACK)):
        Polygon((5.61354075, 15.787598957), (5.511882437, 16.020368344), (7.839576305, 17.036951474), (7.941234618, 16.804182087), align=None)
    extrude(amount=EXTRUDE10_DEPTH + EXTRUDE10_DEPTH_BACK)

    # Chamfer1
    # the kernel refuses this chamfer: 1.3716 mm, written as the material it adds along each edge
    with BuildSketch(Plane(origin=(-8.032741064, 9.827803266, -1.6002), x_dir=(0.9160684273836894, 0.4000782587446979, 0.027495876610586355), z_dir=(-0.4002295787800335, 0.9164149083627771, 0)), Plane(origin=(-8.032741064, 9.827803266, 1.6002), x_dir=(-0.02519763124444392, -0.011004663114042402, 0.9996219169112968), z_dir=(-0.4002295787800335, 0.9164149083627771, 0))) as chamfer1_piece_1:
        with BuildLine():
            Line((1.410928155, 0), (-0.077560078, 1.408794766))
            Line((-0.077560078, 1.408794766), (-0.104981706, 1.408040499))
            ThreePointArc((-0.104981706, 1.408040499), (-0.046811648, 0.704176463), (-0.027421628, -0.000754267))
            Line((-0.027421628, -0.000754267), (0.000754267, -0.027421628))
            ThreePointArc((0.000754267, -0.027421628), (0.705684997, -0.008031609), (1.411682421, -0.027421628))
            Line((1.411682421, -0.027421628), (1.410928155, 0))
        make_face()
    extrude(amount=0.254)


solid = Compound([part.part, body_2.part, body_4_2.part, body_5_1.part])
